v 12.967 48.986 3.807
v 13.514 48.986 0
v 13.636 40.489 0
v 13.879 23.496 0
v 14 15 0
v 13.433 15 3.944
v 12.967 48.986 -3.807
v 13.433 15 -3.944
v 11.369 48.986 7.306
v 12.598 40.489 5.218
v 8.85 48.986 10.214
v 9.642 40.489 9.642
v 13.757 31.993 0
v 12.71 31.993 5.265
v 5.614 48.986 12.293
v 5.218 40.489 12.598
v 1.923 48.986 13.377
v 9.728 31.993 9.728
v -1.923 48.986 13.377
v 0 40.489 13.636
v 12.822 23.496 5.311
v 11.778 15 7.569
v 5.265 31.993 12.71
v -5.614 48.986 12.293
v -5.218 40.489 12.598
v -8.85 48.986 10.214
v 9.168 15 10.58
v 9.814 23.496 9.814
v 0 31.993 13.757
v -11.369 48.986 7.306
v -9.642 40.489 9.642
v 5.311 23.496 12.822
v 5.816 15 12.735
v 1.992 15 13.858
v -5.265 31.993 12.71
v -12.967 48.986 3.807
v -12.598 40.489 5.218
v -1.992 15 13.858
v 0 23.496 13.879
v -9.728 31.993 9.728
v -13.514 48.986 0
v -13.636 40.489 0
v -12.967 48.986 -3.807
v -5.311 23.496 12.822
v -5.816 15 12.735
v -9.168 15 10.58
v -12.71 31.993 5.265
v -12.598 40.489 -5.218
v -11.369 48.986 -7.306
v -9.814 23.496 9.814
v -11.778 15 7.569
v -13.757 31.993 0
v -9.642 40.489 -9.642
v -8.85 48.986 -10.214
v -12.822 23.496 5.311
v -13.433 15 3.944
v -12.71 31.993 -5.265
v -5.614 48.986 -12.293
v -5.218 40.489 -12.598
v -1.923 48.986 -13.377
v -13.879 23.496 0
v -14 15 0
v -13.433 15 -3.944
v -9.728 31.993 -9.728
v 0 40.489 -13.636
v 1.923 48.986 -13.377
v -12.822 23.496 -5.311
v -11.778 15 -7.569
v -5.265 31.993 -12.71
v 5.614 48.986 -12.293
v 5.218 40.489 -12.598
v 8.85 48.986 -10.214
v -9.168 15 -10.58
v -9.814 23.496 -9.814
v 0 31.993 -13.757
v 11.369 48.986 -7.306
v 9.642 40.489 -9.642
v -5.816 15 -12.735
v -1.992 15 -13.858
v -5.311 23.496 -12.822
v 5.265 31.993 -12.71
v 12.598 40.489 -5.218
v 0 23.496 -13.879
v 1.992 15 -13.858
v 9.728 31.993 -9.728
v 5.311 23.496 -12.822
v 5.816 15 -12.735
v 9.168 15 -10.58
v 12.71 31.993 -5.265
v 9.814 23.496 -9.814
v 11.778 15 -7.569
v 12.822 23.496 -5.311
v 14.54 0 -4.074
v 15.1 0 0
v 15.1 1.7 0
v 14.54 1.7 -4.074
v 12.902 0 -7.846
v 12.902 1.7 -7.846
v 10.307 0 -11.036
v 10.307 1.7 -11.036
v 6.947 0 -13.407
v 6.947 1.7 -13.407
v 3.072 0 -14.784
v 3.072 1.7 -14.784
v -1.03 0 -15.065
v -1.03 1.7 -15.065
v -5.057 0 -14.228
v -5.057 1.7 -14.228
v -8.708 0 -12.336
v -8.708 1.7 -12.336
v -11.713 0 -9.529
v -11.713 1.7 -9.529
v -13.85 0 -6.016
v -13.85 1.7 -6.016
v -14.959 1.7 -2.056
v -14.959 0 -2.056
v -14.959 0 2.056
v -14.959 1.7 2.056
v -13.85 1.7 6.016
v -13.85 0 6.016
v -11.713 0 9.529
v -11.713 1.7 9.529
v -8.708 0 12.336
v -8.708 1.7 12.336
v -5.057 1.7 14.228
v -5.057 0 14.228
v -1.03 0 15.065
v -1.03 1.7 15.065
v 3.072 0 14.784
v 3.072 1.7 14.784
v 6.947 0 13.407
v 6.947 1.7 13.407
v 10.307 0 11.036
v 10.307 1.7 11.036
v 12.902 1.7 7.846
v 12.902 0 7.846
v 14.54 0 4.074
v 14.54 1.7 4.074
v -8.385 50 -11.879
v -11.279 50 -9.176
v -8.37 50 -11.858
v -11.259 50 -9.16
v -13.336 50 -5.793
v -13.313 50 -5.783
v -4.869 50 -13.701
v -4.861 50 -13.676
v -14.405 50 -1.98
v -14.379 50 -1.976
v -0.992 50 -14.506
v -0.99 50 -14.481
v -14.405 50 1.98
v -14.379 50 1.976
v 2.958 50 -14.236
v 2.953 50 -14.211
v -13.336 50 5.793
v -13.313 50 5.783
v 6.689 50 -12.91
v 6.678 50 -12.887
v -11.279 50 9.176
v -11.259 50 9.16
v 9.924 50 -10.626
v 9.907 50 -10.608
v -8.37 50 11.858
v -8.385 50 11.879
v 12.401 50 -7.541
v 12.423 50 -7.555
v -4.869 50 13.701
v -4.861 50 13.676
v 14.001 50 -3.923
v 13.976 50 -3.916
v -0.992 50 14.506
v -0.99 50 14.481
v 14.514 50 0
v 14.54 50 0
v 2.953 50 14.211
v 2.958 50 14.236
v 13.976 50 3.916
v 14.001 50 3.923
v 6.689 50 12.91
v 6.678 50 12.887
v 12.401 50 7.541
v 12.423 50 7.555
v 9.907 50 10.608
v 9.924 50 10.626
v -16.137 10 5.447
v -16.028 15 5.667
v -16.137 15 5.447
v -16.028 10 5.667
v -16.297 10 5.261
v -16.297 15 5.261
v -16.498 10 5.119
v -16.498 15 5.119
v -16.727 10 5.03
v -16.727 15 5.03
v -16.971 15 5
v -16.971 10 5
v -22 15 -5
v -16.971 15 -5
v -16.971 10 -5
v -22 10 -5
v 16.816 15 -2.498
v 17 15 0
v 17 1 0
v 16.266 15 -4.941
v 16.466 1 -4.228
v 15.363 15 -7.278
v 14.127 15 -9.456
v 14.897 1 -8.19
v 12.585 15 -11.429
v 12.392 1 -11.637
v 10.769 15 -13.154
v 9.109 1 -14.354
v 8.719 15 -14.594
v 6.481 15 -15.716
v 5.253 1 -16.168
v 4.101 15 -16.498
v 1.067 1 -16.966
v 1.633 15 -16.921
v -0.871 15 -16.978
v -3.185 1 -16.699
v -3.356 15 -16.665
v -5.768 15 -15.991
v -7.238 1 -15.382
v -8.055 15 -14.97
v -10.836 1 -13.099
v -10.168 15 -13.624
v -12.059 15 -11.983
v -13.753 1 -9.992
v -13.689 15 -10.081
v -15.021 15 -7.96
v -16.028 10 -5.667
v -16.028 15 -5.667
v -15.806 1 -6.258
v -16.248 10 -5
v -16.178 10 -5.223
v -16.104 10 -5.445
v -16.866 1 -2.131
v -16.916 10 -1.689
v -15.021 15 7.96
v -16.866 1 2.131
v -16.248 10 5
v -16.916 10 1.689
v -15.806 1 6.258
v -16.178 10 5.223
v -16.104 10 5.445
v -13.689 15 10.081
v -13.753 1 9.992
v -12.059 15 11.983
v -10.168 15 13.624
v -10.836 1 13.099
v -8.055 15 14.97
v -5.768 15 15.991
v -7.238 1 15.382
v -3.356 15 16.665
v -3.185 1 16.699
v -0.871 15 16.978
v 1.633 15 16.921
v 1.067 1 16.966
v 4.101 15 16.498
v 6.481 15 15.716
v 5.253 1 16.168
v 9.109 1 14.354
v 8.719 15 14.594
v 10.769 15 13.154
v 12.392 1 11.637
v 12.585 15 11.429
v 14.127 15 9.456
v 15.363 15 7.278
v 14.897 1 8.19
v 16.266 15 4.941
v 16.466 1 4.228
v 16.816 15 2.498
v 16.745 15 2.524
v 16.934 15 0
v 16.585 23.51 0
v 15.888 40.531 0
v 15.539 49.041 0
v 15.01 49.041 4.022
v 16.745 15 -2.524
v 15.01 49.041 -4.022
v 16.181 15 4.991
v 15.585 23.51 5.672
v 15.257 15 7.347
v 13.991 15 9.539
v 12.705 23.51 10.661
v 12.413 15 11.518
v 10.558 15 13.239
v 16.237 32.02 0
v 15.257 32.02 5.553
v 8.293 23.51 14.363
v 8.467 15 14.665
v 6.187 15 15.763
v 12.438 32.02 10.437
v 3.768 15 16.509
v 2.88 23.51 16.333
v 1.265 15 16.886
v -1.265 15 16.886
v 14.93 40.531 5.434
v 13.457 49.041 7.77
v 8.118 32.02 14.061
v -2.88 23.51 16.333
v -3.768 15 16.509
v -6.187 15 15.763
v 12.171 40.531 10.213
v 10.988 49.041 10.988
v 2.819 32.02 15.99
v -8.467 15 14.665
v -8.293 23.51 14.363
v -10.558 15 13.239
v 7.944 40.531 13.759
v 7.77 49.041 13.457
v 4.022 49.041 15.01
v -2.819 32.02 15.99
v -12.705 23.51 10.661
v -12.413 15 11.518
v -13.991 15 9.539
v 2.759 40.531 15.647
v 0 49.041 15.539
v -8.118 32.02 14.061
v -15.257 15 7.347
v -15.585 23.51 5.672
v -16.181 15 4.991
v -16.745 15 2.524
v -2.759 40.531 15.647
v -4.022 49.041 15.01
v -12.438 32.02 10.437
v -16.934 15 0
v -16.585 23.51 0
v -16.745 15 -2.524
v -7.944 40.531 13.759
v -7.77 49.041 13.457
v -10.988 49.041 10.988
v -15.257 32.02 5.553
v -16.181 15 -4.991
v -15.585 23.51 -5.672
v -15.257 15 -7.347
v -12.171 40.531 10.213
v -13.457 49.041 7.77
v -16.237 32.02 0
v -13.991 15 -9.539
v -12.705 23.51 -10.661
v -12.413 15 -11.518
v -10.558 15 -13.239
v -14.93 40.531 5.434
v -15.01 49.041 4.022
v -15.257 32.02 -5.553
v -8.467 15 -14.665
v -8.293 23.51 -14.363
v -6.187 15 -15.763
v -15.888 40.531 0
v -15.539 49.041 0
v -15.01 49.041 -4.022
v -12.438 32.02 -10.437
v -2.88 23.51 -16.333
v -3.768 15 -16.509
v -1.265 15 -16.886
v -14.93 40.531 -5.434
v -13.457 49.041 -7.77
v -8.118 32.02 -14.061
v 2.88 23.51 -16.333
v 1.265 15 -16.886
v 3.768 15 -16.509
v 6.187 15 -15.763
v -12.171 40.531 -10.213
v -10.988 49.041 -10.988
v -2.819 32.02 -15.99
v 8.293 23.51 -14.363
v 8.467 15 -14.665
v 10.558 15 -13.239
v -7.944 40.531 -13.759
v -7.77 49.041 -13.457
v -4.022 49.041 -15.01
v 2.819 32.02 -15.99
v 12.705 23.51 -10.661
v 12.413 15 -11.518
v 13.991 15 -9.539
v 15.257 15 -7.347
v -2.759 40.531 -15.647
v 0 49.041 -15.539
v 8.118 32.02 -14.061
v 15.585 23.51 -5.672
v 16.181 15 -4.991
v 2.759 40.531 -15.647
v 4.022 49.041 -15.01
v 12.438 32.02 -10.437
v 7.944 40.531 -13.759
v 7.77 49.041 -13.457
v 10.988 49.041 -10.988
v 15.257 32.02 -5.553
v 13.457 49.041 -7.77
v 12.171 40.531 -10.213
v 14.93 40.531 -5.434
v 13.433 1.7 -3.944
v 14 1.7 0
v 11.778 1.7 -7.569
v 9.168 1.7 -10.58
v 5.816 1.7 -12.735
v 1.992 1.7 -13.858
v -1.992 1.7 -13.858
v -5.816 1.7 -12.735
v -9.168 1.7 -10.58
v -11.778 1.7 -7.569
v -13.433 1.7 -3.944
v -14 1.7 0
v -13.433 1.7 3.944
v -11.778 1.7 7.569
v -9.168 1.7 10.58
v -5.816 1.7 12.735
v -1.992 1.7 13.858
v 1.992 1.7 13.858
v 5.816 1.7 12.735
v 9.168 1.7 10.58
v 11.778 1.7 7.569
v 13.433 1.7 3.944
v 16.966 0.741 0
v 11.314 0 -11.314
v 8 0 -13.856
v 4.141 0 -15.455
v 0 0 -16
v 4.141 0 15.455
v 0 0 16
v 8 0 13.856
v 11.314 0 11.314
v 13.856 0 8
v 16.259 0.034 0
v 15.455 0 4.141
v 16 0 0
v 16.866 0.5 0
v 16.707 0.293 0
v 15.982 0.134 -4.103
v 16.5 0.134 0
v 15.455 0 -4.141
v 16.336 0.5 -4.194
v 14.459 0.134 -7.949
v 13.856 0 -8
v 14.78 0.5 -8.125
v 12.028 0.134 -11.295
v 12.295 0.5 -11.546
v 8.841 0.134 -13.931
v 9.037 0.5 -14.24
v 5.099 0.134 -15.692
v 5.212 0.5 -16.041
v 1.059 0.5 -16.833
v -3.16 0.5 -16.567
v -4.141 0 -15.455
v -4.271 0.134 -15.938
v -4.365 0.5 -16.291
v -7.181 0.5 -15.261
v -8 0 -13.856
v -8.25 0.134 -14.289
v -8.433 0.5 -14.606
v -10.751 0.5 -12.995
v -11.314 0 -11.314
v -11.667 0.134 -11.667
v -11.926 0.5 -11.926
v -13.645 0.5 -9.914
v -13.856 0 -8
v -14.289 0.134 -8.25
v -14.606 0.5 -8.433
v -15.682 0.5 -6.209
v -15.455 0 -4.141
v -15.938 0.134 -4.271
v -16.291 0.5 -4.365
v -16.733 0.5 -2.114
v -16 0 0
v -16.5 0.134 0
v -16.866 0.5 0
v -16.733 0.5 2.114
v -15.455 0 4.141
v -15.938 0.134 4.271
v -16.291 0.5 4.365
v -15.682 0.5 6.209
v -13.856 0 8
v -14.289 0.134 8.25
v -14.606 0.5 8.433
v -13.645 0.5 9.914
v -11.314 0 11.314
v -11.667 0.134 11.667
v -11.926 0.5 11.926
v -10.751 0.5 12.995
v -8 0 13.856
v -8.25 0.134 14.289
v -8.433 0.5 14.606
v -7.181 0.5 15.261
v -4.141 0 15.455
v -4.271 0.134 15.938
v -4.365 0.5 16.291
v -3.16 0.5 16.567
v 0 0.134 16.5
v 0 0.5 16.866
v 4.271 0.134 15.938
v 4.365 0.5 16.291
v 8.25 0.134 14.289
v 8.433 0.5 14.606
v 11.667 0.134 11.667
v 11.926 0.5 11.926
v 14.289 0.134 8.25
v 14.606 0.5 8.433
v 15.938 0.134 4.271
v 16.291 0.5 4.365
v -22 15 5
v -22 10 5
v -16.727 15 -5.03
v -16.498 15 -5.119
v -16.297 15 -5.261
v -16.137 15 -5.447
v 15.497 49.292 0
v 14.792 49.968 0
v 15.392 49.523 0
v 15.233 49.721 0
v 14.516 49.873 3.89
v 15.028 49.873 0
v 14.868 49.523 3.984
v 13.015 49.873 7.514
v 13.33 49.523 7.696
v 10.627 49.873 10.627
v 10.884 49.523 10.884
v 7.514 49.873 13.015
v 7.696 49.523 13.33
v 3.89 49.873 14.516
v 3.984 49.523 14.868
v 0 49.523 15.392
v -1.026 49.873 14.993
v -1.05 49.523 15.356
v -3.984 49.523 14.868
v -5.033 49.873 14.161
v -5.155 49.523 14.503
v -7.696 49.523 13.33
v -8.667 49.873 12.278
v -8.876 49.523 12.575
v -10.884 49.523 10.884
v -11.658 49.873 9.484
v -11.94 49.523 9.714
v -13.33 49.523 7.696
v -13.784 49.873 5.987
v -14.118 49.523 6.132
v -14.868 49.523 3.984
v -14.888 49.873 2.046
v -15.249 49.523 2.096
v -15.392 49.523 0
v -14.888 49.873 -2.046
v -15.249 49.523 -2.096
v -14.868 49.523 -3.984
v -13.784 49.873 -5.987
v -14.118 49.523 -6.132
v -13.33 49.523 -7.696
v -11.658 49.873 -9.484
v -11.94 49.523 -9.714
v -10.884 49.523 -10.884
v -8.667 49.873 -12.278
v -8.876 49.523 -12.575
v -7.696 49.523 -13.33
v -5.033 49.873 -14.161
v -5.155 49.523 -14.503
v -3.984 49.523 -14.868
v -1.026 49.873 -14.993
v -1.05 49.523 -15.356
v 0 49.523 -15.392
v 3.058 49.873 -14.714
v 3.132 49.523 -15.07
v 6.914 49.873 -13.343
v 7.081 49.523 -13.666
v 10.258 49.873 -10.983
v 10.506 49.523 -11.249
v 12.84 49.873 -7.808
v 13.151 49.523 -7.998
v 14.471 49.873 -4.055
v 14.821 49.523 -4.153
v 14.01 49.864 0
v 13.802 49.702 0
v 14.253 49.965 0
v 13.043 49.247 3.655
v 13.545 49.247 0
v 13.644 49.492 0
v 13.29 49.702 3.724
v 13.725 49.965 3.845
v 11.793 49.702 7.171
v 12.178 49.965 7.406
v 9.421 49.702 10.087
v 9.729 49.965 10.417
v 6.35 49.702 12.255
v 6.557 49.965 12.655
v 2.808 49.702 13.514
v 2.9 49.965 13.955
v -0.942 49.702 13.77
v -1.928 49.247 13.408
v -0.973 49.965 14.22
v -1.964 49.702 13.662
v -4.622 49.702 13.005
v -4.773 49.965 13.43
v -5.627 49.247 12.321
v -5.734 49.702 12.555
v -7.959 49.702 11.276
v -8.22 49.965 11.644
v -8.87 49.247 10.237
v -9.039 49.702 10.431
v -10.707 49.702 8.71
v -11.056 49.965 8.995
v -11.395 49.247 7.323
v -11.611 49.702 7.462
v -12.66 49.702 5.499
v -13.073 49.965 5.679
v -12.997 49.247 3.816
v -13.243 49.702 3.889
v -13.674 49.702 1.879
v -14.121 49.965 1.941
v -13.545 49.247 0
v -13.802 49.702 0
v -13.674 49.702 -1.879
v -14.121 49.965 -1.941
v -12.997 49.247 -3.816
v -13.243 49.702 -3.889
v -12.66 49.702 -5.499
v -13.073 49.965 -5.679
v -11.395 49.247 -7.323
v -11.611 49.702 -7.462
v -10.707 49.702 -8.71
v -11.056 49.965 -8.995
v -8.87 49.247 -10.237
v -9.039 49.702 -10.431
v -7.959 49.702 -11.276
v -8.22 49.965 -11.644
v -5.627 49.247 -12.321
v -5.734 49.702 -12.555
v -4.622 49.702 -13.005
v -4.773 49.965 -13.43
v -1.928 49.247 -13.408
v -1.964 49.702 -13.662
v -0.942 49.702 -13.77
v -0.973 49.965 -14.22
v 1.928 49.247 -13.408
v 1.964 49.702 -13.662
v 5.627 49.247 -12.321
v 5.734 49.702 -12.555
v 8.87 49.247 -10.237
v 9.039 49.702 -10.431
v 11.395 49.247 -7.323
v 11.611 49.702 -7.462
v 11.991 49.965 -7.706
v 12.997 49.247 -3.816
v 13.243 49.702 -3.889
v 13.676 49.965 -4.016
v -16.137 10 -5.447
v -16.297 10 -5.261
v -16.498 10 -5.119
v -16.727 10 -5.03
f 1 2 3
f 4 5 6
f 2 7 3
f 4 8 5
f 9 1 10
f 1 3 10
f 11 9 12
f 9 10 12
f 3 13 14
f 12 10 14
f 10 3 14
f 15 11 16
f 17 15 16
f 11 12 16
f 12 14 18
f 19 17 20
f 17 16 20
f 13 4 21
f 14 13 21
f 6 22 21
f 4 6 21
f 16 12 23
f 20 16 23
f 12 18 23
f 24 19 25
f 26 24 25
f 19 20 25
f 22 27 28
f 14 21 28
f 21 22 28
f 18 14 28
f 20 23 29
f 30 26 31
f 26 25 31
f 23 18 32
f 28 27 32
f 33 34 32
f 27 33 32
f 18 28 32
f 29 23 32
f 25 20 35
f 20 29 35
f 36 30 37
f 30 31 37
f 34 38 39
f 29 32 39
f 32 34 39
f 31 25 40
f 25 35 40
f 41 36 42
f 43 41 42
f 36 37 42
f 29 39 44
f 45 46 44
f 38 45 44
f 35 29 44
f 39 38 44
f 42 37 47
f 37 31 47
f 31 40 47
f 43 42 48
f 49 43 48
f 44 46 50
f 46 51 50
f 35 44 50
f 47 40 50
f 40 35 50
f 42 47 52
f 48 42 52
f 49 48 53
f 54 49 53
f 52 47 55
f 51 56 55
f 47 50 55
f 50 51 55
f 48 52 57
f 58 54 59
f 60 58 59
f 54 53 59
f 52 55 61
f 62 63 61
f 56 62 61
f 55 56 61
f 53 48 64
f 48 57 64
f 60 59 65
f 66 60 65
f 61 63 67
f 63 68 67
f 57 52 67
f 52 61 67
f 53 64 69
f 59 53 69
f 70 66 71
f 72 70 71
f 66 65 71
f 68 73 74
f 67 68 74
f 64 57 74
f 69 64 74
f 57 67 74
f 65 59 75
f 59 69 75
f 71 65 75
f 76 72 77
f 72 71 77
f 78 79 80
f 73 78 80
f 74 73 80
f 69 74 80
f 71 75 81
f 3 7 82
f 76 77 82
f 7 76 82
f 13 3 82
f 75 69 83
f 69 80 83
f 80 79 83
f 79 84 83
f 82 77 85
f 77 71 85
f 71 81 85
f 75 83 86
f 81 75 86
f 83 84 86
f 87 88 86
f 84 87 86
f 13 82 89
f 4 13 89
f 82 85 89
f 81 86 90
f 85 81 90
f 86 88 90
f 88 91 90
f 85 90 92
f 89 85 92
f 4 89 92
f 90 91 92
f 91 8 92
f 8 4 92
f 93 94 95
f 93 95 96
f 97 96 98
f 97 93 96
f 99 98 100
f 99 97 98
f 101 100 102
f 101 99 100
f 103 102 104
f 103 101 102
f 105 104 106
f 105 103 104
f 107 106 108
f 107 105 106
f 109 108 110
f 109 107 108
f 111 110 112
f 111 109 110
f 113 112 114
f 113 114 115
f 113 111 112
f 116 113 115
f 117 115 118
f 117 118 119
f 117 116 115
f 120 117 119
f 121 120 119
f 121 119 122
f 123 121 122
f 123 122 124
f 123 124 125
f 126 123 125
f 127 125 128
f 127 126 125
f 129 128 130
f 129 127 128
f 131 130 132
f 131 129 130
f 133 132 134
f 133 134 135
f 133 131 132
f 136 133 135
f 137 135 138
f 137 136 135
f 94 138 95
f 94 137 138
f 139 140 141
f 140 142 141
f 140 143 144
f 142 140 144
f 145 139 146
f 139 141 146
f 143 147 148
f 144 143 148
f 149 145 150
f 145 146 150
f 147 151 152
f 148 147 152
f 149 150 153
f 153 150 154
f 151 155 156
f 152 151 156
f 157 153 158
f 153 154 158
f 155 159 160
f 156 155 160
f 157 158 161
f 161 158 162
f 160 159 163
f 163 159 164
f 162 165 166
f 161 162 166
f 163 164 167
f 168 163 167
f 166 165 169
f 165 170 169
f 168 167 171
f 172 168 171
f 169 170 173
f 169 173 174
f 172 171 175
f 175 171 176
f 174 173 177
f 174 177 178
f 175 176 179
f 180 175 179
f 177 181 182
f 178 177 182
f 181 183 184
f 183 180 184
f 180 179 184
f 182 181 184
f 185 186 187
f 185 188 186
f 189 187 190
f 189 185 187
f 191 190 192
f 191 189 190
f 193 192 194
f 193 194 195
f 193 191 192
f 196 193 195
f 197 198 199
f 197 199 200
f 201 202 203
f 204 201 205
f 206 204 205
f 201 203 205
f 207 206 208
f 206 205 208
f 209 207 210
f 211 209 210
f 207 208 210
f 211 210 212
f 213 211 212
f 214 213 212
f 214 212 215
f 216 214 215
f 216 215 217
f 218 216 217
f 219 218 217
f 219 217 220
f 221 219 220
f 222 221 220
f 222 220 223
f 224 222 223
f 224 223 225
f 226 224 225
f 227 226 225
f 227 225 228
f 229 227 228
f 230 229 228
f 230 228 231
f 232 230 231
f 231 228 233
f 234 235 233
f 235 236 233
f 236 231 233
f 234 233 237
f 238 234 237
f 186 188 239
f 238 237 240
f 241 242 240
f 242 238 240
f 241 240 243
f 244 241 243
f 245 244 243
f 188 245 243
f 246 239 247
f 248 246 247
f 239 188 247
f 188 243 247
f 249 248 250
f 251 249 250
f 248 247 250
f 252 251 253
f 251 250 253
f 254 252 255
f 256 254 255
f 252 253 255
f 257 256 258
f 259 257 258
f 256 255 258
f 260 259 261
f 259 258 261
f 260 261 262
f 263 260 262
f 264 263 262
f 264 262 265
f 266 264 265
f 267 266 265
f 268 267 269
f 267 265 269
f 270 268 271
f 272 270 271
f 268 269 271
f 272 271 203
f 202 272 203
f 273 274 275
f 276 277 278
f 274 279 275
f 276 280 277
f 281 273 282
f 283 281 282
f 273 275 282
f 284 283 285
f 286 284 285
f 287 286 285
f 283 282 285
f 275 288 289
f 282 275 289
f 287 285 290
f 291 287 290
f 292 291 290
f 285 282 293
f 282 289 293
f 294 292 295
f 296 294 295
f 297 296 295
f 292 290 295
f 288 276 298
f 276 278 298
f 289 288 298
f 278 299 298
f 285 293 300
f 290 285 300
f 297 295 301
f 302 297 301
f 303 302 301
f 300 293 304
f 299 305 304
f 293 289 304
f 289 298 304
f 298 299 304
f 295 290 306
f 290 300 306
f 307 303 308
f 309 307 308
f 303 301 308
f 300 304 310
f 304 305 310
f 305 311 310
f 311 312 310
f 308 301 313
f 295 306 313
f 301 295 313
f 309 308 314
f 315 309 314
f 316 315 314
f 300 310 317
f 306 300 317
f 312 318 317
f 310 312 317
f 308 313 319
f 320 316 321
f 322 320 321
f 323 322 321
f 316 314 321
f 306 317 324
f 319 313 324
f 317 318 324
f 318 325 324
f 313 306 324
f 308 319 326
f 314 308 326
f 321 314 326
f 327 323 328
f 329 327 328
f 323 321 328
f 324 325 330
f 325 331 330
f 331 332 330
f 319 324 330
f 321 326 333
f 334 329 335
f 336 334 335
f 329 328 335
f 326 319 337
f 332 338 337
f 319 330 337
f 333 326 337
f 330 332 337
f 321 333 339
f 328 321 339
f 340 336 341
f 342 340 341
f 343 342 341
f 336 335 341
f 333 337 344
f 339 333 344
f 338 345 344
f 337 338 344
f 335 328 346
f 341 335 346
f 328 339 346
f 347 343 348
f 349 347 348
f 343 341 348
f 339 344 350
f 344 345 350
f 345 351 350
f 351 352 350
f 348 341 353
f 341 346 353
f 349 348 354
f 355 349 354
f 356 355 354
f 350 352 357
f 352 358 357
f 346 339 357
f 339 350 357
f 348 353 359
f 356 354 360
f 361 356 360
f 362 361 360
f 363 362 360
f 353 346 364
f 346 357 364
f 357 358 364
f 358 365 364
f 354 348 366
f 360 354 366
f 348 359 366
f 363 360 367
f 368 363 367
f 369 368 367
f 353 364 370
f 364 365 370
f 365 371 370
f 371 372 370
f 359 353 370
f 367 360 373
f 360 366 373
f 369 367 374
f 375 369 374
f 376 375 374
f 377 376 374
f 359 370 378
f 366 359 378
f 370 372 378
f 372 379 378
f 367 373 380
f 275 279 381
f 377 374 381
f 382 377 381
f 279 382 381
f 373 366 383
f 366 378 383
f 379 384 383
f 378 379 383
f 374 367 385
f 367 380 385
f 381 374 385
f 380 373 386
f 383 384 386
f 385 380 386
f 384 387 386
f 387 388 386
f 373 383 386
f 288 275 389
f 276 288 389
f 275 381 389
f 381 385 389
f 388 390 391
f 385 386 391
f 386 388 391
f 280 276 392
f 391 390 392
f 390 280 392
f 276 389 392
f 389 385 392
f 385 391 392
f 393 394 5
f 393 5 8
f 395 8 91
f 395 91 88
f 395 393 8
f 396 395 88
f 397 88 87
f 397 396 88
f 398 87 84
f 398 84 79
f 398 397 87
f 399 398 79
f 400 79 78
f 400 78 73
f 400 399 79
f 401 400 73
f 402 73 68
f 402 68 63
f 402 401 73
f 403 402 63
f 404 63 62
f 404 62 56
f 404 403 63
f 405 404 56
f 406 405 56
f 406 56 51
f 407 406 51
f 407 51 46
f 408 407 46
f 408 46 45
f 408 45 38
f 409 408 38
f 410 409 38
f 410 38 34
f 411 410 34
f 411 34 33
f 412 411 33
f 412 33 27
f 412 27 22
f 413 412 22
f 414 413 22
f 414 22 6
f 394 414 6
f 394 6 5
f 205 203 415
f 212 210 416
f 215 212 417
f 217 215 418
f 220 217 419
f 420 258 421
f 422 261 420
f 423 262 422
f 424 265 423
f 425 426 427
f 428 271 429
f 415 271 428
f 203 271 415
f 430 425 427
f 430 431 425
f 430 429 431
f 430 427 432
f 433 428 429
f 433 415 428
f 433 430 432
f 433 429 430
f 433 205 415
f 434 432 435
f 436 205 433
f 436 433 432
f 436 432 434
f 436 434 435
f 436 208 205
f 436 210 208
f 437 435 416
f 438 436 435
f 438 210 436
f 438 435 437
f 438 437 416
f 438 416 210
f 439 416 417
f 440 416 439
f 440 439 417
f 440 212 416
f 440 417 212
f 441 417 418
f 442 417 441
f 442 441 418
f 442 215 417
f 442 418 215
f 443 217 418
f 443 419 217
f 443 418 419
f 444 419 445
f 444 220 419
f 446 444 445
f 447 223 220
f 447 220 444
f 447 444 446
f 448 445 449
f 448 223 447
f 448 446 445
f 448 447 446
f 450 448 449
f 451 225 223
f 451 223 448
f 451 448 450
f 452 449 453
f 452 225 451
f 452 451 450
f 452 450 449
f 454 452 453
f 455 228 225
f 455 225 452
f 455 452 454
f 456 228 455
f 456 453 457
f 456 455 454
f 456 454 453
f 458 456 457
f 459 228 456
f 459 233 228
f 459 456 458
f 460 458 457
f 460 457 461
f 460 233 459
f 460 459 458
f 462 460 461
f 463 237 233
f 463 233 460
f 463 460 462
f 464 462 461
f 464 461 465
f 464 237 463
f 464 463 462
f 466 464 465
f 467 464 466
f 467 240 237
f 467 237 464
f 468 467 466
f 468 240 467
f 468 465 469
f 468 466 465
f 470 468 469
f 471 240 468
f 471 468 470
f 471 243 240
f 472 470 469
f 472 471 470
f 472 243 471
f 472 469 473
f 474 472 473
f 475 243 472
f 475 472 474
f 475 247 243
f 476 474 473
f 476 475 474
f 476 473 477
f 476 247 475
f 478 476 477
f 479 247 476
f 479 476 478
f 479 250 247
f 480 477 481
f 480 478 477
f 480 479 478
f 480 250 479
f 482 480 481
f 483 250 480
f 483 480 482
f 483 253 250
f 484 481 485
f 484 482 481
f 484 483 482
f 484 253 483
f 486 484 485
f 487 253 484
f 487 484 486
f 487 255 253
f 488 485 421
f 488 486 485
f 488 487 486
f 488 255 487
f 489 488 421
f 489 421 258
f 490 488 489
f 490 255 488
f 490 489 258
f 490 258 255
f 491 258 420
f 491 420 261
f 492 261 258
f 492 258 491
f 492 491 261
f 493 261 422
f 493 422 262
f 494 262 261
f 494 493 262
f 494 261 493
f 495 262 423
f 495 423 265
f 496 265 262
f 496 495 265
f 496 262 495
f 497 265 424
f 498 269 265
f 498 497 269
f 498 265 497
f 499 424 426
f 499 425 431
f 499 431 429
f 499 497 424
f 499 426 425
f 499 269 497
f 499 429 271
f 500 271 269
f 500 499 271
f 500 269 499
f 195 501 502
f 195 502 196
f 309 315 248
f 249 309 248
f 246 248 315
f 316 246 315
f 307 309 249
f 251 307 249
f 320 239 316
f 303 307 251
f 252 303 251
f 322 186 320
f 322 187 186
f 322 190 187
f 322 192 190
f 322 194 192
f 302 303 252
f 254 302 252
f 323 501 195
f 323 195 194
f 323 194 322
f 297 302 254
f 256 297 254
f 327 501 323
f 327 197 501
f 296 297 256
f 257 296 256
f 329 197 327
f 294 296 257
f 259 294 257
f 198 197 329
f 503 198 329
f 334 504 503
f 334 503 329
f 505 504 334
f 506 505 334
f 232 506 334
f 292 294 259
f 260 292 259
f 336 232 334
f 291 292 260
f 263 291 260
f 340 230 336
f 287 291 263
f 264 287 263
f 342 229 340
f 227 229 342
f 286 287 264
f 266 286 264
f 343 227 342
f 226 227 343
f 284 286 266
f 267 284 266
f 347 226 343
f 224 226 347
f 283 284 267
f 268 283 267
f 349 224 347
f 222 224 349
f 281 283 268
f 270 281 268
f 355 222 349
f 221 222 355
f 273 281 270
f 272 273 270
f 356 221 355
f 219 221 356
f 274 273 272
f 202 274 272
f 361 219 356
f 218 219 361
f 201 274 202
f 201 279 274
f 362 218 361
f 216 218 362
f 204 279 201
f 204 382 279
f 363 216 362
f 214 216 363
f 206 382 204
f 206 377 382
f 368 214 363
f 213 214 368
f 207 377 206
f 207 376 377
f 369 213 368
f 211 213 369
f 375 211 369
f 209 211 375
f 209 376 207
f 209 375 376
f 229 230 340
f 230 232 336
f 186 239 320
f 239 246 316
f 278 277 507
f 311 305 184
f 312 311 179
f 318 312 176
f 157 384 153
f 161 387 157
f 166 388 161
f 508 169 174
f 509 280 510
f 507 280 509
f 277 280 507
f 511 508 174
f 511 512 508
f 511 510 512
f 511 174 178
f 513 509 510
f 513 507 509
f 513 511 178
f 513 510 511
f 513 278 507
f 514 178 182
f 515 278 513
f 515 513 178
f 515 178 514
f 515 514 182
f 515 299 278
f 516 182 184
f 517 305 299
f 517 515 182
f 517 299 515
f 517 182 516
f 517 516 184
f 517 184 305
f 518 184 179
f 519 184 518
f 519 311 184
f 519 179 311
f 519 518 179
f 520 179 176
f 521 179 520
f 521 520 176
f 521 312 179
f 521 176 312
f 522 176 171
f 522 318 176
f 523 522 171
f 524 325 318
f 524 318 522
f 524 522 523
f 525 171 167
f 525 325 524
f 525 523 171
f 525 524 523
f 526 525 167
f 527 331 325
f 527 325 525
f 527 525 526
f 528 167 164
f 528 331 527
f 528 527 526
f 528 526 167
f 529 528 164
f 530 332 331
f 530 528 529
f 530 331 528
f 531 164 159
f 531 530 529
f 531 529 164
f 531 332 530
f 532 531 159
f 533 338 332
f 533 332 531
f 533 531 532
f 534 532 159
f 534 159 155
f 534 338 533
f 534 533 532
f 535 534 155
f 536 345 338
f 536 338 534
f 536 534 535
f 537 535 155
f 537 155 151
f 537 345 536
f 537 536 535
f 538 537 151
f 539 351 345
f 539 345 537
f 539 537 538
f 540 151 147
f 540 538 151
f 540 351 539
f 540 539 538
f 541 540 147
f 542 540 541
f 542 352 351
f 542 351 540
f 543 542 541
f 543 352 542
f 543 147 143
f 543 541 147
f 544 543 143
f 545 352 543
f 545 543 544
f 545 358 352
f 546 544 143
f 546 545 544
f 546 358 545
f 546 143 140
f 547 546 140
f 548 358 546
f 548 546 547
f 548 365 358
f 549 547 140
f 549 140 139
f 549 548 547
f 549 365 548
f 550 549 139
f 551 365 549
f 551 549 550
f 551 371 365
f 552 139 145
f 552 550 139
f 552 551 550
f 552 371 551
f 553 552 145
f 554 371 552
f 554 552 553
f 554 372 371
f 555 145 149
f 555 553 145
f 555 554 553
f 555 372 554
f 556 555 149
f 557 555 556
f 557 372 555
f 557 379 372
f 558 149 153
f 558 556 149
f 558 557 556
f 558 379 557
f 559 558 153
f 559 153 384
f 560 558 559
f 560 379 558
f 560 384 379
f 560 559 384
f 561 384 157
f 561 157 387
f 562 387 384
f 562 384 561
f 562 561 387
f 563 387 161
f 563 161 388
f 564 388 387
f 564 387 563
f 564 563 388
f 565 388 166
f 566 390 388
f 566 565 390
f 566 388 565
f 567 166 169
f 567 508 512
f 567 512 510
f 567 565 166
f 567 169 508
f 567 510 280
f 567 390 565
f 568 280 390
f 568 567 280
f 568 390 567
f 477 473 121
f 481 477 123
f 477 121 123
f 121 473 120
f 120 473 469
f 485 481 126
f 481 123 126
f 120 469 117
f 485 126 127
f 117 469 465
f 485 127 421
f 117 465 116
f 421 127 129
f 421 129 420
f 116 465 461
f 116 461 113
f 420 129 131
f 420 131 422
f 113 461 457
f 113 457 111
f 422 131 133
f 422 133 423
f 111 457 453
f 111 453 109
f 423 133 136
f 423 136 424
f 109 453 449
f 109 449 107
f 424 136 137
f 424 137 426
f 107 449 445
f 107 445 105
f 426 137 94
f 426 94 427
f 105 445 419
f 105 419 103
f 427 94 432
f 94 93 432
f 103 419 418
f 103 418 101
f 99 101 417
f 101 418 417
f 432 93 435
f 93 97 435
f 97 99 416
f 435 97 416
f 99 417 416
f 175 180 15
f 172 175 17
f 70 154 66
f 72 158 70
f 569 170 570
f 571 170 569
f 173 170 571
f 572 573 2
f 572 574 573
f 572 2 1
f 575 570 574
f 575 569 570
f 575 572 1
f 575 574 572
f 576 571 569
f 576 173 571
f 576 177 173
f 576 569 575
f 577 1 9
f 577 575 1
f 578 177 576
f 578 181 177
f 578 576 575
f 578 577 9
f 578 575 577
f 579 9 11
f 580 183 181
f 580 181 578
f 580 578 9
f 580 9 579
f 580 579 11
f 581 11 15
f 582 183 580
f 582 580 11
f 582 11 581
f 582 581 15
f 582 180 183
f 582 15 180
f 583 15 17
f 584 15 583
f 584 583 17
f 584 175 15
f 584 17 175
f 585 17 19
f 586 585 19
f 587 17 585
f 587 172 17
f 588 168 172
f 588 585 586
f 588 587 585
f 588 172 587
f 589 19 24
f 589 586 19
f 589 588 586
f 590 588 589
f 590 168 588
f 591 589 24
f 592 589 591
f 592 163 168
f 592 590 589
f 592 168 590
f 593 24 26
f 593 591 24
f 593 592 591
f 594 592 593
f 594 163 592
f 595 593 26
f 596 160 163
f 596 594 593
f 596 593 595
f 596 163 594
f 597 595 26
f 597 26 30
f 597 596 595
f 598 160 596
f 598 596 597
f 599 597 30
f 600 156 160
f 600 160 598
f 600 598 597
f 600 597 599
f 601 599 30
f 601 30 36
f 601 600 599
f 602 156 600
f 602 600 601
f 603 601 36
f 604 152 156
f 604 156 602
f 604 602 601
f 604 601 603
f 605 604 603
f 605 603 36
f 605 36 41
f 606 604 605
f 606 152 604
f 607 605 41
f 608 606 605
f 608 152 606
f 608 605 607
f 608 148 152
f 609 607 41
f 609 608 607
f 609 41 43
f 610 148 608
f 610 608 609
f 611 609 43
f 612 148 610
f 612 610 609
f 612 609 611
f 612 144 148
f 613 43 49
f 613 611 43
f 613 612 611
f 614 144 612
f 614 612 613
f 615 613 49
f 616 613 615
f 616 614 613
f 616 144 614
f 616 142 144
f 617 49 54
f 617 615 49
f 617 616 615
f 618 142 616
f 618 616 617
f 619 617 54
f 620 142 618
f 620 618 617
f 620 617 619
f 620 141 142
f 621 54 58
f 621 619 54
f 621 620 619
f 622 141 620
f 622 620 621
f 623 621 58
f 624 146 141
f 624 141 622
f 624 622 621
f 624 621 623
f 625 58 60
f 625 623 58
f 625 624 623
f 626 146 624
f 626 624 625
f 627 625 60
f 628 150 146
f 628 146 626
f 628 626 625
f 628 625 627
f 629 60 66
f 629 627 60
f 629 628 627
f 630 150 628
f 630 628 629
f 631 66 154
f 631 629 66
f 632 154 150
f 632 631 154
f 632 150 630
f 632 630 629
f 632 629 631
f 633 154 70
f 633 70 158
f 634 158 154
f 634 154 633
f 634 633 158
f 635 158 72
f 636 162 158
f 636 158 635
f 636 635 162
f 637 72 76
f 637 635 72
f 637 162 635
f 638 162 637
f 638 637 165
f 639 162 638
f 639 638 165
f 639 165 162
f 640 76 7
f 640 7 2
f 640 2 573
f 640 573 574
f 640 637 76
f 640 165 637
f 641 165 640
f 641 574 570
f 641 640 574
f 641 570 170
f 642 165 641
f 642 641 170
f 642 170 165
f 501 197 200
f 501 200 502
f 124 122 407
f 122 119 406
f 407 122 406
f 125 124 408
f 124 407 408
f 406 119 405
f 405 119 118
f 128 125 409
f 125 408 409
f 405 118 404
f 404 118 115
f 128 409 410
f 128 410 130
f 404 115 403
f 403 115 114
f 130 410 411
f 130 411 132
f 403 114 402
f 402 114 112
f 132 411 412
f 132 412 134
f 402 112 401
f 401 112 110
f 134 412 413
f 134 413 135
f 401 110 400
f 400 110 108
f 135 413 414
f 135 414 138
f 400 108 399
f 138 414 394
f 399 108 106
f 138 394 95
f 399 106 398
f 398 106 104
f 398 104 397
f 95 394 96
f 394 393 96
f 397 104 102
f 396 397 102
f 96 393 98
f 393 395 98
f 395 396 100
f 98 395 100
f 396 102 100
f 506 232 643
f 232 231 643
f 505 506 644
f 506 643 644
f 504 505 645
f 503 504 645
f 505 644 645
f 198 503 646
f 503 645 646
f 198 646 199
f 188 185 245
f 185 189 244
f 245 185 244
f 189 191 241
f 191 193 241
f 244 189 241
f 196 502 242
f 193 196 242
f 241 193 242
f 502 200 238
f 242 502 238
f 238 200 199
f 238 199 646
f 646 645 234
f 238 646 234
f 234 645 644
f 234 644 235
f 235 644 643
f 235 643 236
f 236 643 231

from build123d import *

# Parameters (mm, degrees)
SKETCH_1_R          = 17
SKETCH_1_R_2        = 14
EXTRUDE_1_DEPTH     = 15
SKETCH_2_R          = 15.1
SKETCH_2_R_2        = 14
CUT_EXTRUDE_1_DEPTH = 1.7
EXTRUDE_2_DEPTH     = 5
FILLET_1_R          = 1
FILLET_2_R          = 1


with BuildPart() as part:
    # 草图1 → 凸台-拉伸1 (new body)
    with BuildSketch(Plane(origin=(0, 0, 0), x_dir=(1, 0, 0), z_dir=(0, 1, 0))):
        Circle(SKETCH_1_R)
        Circle(SKETCH_1_R_2, mode=Mode.SUBTRACT)
    extrude(amount=EXTRUDE_1_DEPTH)

    # 草图2 → 切除-拉伸1 (cut)
    with BuildSketch(Plane(origin=(0, 0, 0), x_dir=(1, 0, 0), z_dir=(0, 1, 0))):
        Circle(SKETCH_2_R)
        Circle(SKETCH_2_R_2, mode=Mode.SUBTRACT)
    extrude(amount=CUT_EXTRUDE_1_DEPTH, mode=Mode.SUBTRACT)

    # 草图3 → 凸台-拉伸2 (add)
    with BuildSketch(Plane(origin=(0, 15, 0), x_dir=(1, 0, 0), z_dir=(0, 1, 0))):
        with BuildLine():
            Line((-22, 5), (-22, -5))
            Line((-22, -5), (-16.248076809, -5))
            ThreePointArc((-16.248076809, -5), (-17, 0), (-16.248076809, 5))
            Line((-16.248076809, 5), (-22, 5))
        make_face()
    extrude(amount=-EXTRUDE_2_DEPTH)

    # 草图11 → 旋转1 (revolve)
    with BuildSketch(Plane.XY):
        Polygon((13.5, 50), (14, 15), (16.933723731, 15), (15.5, 50), align=None)
    revolve(axis=Axis((0, 50, 0), (0, -1, 0)))

    # 圆角1
    fillet_1_edges = [part.edges().sort_by_distance(p)[0] for p in [
        (-17, 0, 0),
        (-15.5, 50, 0),
        (-13.5, 50, 0),
    ]]
    fillet(fillet_1_edges, radius=FILLET_1_R)

    # 圆角2
    fillet_2_edges = [part.edges().sort_by_distance(p)[0] for p in [
        (-16.248076809, 12.5, -5),
        (-16.248076809, 12.5, 5),
    ]]
    fillet(fillet_2_edges, radius=FILLET_2_R)


solid = part.part
